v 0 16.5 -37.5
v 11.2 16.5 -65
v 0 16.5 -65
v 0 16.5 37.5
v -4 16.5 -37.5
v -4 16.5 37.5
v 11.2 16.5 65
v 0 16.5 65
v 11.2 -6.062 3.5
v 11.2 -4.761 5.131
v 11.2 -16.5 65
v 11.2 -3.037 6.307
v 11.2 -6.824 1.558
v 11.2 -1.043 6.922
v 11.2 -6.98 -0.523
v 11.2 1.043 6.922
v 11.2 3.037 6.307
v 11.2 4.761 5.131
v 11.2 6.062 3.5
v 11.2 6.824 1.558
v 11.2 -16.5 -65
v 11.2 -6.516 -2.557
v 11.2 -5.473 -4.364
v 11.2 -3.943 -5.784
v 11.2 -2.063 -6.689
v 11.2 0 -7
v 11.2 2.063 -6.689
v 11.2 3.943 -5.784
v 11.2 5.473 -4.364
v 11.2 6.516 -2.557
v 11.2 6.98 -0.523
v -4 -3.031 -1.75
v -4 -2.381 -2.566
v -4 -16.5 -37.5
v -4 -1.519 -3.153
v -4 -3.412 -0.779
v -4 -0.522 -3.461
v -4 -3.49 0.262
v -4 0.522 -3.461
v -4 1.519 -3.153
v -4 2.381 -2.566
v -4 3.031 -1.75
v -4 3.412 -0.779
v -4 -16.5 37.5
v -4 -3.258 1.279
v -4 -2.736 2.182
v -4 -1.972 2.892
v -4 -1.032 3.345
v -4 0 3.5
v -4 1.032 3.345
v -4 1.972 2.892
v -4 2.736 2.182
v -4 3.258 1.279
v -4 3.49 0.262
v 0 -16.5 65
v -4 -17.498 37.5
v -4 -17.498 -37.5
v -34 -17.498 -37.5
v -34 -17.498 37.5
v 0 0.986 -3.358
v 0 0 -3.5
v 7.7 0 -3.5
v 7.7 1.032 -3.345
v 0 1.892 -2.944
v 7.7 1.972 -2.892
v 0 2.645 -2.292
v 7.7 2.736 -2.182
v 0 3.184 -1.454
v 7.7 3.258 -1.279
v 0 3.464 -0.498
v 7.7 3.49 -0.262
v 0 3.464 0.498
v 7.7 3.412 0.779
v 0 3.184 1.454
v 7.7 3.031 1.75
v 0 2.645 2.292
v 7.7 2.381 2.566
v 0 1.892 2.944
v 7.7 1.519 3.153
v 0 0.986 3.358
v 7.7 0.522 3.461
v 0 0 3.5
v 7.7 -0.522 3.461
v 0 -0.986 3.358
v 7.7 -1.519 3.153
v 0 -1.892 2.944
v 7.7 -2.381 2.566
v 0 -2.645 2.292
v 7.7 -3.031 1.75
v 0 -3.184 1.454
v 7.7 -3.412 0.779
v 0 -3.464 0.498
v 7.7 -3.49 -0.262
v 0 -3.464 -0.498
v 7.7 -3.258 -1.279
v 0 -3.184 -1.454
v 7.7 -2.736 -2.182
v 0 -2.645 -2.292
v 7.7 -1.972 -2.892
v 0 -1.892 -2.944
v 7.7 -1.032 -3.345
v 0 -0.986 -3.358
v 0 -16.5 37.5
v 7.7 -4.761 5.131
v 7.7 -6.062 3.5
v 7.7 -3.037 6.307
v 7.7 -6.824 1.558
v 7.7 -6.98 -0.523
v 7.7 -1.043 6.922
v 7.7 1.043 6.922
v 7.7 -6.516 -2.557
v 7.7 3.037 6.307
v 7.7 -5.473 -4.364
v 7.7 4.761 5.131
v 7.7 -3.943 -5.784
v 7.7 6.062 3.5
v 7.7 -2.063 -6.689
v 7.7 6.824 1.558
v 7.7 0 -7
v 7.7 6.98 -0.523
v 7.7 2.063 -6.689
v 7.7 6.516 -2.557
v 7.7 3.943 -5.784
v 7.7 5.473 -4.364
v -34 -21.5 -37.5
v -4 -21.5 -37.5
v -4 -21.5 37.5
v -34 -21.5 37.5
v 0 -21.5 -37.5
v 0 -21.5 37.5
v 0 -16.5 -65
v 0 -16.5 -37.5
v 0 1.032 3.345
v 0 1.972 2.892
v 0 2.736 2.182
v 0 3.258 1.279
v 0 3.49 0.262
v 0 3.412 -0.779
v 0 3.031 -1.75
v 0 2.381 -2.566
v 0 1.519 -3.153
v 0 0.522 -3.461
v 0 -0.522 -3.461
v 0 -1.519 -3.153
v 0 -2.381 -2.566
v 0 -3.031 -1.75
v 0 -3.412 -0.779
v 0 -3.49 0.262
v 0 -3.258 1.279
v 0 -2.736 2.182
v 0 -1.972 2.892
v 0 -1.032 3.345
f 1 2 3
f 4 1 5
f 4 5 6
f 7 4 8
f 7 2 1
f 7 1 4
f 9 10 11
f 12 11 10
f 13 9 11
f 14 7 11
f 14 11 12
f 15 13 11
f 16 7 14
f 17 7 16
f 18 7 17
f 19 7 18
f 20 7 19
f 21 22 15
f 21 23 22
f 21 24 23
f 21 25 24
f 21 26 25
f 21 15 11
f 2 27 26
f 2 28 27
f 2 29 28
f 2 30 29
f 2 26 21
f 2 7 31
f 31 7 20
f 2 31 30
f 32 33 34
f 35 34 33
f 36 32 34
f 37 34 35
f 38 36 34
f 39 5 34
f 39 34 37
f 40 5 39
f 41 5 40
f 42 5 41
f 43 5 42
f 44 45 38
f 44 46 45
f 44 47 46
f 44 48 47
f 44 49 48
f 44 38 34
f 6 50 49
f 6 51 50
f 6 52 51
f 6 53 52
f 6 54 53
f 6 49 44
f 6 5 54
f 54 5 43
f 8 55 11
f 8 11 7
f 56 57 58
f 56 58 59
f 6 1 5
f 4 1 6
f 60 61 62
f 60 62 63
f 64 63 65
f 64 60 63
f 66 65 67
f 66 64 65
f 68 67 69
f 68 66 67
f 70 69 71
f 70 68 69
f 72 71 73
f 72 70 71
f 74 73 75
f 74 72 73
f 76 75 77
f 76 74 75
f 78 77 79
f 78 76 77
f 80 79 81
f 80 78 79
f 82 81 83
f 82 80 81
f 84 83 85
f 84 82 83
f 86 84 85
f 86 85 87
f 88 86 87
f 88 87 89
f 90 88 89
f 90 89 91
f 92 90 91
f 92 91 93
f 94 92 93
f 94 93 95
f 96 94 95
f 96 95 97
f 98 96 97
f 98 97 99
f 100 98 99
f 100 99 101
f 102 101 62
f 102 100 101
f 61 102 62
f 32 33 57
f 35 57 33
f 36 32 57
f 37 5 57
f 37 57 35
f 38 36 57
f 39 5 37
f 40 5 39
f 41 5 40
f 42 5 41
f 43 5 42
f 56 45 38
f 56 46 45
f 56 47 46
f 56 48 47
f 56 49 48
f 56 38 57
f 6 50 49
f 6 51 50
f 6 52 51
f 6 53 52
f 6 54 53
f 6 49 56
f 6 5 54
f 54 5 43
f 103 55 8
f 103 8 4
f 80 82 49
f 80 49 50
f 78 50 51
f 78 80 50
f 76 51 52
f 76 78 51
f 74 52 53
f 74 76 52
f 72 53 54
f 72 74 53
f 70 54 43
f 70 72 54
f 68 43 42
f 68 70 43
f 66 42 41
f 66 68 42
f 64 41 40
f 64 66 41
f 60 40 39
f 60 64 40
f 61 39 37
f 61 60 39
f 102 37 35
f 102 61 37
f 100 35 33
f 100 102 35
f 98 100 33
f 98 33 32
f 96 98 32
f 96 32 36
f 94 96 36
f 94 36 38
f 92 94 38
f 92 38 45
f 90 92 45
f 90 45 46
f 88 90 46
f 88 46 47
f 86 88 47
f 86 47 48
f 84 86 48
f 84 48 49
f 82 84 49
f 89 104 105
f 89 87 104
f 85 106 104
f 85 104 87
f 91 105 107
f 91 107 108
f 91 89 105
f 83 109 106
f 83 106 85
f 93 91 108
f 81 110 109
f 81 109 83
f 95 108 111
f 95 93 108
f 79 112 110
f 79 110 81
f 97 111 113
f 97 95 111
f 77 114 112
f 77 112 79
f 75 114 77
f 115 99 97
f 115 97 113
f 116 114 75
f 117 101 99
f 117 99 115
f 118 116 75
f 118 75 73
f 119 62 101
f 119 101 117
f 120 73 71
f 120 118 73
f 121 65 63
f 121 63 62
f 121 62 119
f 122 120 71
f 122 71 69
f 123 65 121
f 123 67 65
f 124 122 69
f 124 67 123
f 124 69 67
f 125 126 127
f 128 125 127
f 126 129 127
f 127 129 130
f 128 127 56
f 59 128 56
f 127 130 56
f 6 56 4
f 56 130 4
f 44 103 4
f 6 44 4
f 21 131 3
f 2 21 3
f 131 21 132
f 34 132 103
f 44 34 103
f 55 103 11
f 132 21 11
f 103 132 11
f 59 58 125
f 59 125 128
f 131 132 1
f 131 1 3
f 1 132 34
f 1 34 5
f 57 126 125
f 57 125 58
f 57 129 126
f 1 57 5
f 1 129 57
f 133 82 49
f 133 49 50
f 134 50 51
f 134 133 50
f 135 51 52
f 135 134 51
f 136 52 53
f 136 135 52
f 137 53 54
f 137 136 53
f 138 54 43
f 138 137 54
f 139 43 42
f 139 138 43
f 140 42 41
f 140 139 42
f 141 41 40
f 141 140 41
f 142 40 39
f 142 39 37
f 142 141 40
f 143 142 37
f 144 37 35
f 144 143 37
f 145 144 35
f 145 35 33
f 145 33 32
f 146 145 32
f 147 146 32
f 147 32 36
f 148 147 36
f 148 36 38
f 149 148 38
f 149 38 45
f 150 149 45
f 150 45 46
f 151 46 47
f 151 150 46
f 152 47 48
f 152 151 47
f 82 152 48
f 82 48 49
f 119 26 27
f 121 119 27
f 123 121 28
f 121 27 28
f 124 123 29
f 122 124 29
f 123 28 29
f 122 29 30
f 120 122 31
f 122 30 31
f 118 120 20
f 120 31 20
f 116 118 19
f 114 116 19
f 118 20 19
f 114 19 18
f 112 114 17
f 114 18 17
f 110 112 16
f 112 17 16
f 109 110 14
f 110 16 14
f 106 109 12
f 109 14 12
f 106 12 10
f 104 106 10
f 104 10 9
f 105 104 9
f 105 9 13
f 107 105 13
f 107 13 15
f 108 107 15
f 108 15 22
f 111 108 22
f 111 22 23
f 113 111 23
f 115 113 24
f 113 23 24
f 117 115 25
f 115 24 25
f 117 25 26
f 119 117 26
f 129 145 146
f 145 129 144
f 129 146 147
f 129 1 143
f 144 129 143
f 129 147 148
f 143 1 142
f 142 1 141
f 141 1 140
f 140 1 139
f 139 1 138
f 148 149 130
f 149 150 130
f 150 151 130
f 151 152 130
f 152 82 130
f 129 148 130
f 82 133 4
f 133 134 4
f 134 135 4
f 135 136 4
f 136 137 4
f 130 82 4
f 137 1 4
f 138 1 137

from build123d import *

# Parameters (mm, degrees)
SKETCH1_W           = 130
SKETCH1_H           = 33
SKETCH1_R           = 3.5
BOSS_EXTRUDE1_DEPTH = 11.2
SKETCH2_R           = 7
CUT_EXTRUDE1_DEPTH  = 3.5
BOSS_EXTRUDE2_START = 4
SKETCH3_W           = 75
SKETCH3_H           = 33
SKETCH3_R           = 3.5
BOSS_EXTRUDE2_DEPTH = 4
SKETCH3_3_W         = 75
SKETCH3_3_H         = 38
SKETCH3_3_R         = 3.5
BOSS_EXTRUDE4_DEPTH = 4
SKETCH6_W           = 75
SKETCH6_H           = 4.002033335
BOSS_EXTRUDE6_DEPTH = 30


with BuildPart() as part:
    # Sketch1 → Boss-Extrude1 (new body)
    with BuildSketch(Plane(origin=(0, 0, 0), x_dir=(0, 0, -1), z_dir=(1, 0, 0))):
        Rectangle(SKETCH1_W, SKETCH1_H)
        Circle(SKETCH1_R, mode=Mode.SUBTRACT)
    extrude(amount=BOSS_EXTRUDE1_DEPTH)

    # Sketch2 → Cut-Extrude1 (cut)
    with BuildSketch(Plane(origin=(11.2, 0, 0), x_dir=(0, 0, -1), z_dir=(1, 0, 0))):
        Circle(SKETCH2_R)
    extrude(amount=-CUT_EXTRUDE1_DEPTH, mode=Mode.SUBTRACT)

    # Sketch3 → Boss-Extrude2 (add)
    with BuildSketch(Plane.ZY.offset(BOSS_EXTRUDE2_START)):
        Rectangle(SKETCH3_W, SKETCH3_H)
        Circle(SKETCH3_R, mode=Mode.SUBTRACT)
    extrude(amount=-BOSS_EXTRUDE2_DEPTH)


with BuildPart() as body_2:
    # Sketch3<3> → Boss-Extrude4 (new body)
    with BuildSketch(Plane.ZY):
        with Locations((0, -2.5)):
            Rectangle(SKETCH3_3_W, SKETCH3_3_H)
        Circle(SKETCH3_3_R, mode=Mode.SUBTRACT)
    extrude(amount=BOSS_EXTRUDE4_DEPTH)

    # Sketch6 → Boss-Extrude6 (add)
    with BuildSketch(Plane.ZY.offset(4)):
        with Locations((0, -19.498983332)):
            Rectangle(SKETCH6_W, SKETCH6_H)
    extrude(amount=BOSS_EXTRUDE6_DEPTH)


solid = Compound([part.part, body_2.part])
